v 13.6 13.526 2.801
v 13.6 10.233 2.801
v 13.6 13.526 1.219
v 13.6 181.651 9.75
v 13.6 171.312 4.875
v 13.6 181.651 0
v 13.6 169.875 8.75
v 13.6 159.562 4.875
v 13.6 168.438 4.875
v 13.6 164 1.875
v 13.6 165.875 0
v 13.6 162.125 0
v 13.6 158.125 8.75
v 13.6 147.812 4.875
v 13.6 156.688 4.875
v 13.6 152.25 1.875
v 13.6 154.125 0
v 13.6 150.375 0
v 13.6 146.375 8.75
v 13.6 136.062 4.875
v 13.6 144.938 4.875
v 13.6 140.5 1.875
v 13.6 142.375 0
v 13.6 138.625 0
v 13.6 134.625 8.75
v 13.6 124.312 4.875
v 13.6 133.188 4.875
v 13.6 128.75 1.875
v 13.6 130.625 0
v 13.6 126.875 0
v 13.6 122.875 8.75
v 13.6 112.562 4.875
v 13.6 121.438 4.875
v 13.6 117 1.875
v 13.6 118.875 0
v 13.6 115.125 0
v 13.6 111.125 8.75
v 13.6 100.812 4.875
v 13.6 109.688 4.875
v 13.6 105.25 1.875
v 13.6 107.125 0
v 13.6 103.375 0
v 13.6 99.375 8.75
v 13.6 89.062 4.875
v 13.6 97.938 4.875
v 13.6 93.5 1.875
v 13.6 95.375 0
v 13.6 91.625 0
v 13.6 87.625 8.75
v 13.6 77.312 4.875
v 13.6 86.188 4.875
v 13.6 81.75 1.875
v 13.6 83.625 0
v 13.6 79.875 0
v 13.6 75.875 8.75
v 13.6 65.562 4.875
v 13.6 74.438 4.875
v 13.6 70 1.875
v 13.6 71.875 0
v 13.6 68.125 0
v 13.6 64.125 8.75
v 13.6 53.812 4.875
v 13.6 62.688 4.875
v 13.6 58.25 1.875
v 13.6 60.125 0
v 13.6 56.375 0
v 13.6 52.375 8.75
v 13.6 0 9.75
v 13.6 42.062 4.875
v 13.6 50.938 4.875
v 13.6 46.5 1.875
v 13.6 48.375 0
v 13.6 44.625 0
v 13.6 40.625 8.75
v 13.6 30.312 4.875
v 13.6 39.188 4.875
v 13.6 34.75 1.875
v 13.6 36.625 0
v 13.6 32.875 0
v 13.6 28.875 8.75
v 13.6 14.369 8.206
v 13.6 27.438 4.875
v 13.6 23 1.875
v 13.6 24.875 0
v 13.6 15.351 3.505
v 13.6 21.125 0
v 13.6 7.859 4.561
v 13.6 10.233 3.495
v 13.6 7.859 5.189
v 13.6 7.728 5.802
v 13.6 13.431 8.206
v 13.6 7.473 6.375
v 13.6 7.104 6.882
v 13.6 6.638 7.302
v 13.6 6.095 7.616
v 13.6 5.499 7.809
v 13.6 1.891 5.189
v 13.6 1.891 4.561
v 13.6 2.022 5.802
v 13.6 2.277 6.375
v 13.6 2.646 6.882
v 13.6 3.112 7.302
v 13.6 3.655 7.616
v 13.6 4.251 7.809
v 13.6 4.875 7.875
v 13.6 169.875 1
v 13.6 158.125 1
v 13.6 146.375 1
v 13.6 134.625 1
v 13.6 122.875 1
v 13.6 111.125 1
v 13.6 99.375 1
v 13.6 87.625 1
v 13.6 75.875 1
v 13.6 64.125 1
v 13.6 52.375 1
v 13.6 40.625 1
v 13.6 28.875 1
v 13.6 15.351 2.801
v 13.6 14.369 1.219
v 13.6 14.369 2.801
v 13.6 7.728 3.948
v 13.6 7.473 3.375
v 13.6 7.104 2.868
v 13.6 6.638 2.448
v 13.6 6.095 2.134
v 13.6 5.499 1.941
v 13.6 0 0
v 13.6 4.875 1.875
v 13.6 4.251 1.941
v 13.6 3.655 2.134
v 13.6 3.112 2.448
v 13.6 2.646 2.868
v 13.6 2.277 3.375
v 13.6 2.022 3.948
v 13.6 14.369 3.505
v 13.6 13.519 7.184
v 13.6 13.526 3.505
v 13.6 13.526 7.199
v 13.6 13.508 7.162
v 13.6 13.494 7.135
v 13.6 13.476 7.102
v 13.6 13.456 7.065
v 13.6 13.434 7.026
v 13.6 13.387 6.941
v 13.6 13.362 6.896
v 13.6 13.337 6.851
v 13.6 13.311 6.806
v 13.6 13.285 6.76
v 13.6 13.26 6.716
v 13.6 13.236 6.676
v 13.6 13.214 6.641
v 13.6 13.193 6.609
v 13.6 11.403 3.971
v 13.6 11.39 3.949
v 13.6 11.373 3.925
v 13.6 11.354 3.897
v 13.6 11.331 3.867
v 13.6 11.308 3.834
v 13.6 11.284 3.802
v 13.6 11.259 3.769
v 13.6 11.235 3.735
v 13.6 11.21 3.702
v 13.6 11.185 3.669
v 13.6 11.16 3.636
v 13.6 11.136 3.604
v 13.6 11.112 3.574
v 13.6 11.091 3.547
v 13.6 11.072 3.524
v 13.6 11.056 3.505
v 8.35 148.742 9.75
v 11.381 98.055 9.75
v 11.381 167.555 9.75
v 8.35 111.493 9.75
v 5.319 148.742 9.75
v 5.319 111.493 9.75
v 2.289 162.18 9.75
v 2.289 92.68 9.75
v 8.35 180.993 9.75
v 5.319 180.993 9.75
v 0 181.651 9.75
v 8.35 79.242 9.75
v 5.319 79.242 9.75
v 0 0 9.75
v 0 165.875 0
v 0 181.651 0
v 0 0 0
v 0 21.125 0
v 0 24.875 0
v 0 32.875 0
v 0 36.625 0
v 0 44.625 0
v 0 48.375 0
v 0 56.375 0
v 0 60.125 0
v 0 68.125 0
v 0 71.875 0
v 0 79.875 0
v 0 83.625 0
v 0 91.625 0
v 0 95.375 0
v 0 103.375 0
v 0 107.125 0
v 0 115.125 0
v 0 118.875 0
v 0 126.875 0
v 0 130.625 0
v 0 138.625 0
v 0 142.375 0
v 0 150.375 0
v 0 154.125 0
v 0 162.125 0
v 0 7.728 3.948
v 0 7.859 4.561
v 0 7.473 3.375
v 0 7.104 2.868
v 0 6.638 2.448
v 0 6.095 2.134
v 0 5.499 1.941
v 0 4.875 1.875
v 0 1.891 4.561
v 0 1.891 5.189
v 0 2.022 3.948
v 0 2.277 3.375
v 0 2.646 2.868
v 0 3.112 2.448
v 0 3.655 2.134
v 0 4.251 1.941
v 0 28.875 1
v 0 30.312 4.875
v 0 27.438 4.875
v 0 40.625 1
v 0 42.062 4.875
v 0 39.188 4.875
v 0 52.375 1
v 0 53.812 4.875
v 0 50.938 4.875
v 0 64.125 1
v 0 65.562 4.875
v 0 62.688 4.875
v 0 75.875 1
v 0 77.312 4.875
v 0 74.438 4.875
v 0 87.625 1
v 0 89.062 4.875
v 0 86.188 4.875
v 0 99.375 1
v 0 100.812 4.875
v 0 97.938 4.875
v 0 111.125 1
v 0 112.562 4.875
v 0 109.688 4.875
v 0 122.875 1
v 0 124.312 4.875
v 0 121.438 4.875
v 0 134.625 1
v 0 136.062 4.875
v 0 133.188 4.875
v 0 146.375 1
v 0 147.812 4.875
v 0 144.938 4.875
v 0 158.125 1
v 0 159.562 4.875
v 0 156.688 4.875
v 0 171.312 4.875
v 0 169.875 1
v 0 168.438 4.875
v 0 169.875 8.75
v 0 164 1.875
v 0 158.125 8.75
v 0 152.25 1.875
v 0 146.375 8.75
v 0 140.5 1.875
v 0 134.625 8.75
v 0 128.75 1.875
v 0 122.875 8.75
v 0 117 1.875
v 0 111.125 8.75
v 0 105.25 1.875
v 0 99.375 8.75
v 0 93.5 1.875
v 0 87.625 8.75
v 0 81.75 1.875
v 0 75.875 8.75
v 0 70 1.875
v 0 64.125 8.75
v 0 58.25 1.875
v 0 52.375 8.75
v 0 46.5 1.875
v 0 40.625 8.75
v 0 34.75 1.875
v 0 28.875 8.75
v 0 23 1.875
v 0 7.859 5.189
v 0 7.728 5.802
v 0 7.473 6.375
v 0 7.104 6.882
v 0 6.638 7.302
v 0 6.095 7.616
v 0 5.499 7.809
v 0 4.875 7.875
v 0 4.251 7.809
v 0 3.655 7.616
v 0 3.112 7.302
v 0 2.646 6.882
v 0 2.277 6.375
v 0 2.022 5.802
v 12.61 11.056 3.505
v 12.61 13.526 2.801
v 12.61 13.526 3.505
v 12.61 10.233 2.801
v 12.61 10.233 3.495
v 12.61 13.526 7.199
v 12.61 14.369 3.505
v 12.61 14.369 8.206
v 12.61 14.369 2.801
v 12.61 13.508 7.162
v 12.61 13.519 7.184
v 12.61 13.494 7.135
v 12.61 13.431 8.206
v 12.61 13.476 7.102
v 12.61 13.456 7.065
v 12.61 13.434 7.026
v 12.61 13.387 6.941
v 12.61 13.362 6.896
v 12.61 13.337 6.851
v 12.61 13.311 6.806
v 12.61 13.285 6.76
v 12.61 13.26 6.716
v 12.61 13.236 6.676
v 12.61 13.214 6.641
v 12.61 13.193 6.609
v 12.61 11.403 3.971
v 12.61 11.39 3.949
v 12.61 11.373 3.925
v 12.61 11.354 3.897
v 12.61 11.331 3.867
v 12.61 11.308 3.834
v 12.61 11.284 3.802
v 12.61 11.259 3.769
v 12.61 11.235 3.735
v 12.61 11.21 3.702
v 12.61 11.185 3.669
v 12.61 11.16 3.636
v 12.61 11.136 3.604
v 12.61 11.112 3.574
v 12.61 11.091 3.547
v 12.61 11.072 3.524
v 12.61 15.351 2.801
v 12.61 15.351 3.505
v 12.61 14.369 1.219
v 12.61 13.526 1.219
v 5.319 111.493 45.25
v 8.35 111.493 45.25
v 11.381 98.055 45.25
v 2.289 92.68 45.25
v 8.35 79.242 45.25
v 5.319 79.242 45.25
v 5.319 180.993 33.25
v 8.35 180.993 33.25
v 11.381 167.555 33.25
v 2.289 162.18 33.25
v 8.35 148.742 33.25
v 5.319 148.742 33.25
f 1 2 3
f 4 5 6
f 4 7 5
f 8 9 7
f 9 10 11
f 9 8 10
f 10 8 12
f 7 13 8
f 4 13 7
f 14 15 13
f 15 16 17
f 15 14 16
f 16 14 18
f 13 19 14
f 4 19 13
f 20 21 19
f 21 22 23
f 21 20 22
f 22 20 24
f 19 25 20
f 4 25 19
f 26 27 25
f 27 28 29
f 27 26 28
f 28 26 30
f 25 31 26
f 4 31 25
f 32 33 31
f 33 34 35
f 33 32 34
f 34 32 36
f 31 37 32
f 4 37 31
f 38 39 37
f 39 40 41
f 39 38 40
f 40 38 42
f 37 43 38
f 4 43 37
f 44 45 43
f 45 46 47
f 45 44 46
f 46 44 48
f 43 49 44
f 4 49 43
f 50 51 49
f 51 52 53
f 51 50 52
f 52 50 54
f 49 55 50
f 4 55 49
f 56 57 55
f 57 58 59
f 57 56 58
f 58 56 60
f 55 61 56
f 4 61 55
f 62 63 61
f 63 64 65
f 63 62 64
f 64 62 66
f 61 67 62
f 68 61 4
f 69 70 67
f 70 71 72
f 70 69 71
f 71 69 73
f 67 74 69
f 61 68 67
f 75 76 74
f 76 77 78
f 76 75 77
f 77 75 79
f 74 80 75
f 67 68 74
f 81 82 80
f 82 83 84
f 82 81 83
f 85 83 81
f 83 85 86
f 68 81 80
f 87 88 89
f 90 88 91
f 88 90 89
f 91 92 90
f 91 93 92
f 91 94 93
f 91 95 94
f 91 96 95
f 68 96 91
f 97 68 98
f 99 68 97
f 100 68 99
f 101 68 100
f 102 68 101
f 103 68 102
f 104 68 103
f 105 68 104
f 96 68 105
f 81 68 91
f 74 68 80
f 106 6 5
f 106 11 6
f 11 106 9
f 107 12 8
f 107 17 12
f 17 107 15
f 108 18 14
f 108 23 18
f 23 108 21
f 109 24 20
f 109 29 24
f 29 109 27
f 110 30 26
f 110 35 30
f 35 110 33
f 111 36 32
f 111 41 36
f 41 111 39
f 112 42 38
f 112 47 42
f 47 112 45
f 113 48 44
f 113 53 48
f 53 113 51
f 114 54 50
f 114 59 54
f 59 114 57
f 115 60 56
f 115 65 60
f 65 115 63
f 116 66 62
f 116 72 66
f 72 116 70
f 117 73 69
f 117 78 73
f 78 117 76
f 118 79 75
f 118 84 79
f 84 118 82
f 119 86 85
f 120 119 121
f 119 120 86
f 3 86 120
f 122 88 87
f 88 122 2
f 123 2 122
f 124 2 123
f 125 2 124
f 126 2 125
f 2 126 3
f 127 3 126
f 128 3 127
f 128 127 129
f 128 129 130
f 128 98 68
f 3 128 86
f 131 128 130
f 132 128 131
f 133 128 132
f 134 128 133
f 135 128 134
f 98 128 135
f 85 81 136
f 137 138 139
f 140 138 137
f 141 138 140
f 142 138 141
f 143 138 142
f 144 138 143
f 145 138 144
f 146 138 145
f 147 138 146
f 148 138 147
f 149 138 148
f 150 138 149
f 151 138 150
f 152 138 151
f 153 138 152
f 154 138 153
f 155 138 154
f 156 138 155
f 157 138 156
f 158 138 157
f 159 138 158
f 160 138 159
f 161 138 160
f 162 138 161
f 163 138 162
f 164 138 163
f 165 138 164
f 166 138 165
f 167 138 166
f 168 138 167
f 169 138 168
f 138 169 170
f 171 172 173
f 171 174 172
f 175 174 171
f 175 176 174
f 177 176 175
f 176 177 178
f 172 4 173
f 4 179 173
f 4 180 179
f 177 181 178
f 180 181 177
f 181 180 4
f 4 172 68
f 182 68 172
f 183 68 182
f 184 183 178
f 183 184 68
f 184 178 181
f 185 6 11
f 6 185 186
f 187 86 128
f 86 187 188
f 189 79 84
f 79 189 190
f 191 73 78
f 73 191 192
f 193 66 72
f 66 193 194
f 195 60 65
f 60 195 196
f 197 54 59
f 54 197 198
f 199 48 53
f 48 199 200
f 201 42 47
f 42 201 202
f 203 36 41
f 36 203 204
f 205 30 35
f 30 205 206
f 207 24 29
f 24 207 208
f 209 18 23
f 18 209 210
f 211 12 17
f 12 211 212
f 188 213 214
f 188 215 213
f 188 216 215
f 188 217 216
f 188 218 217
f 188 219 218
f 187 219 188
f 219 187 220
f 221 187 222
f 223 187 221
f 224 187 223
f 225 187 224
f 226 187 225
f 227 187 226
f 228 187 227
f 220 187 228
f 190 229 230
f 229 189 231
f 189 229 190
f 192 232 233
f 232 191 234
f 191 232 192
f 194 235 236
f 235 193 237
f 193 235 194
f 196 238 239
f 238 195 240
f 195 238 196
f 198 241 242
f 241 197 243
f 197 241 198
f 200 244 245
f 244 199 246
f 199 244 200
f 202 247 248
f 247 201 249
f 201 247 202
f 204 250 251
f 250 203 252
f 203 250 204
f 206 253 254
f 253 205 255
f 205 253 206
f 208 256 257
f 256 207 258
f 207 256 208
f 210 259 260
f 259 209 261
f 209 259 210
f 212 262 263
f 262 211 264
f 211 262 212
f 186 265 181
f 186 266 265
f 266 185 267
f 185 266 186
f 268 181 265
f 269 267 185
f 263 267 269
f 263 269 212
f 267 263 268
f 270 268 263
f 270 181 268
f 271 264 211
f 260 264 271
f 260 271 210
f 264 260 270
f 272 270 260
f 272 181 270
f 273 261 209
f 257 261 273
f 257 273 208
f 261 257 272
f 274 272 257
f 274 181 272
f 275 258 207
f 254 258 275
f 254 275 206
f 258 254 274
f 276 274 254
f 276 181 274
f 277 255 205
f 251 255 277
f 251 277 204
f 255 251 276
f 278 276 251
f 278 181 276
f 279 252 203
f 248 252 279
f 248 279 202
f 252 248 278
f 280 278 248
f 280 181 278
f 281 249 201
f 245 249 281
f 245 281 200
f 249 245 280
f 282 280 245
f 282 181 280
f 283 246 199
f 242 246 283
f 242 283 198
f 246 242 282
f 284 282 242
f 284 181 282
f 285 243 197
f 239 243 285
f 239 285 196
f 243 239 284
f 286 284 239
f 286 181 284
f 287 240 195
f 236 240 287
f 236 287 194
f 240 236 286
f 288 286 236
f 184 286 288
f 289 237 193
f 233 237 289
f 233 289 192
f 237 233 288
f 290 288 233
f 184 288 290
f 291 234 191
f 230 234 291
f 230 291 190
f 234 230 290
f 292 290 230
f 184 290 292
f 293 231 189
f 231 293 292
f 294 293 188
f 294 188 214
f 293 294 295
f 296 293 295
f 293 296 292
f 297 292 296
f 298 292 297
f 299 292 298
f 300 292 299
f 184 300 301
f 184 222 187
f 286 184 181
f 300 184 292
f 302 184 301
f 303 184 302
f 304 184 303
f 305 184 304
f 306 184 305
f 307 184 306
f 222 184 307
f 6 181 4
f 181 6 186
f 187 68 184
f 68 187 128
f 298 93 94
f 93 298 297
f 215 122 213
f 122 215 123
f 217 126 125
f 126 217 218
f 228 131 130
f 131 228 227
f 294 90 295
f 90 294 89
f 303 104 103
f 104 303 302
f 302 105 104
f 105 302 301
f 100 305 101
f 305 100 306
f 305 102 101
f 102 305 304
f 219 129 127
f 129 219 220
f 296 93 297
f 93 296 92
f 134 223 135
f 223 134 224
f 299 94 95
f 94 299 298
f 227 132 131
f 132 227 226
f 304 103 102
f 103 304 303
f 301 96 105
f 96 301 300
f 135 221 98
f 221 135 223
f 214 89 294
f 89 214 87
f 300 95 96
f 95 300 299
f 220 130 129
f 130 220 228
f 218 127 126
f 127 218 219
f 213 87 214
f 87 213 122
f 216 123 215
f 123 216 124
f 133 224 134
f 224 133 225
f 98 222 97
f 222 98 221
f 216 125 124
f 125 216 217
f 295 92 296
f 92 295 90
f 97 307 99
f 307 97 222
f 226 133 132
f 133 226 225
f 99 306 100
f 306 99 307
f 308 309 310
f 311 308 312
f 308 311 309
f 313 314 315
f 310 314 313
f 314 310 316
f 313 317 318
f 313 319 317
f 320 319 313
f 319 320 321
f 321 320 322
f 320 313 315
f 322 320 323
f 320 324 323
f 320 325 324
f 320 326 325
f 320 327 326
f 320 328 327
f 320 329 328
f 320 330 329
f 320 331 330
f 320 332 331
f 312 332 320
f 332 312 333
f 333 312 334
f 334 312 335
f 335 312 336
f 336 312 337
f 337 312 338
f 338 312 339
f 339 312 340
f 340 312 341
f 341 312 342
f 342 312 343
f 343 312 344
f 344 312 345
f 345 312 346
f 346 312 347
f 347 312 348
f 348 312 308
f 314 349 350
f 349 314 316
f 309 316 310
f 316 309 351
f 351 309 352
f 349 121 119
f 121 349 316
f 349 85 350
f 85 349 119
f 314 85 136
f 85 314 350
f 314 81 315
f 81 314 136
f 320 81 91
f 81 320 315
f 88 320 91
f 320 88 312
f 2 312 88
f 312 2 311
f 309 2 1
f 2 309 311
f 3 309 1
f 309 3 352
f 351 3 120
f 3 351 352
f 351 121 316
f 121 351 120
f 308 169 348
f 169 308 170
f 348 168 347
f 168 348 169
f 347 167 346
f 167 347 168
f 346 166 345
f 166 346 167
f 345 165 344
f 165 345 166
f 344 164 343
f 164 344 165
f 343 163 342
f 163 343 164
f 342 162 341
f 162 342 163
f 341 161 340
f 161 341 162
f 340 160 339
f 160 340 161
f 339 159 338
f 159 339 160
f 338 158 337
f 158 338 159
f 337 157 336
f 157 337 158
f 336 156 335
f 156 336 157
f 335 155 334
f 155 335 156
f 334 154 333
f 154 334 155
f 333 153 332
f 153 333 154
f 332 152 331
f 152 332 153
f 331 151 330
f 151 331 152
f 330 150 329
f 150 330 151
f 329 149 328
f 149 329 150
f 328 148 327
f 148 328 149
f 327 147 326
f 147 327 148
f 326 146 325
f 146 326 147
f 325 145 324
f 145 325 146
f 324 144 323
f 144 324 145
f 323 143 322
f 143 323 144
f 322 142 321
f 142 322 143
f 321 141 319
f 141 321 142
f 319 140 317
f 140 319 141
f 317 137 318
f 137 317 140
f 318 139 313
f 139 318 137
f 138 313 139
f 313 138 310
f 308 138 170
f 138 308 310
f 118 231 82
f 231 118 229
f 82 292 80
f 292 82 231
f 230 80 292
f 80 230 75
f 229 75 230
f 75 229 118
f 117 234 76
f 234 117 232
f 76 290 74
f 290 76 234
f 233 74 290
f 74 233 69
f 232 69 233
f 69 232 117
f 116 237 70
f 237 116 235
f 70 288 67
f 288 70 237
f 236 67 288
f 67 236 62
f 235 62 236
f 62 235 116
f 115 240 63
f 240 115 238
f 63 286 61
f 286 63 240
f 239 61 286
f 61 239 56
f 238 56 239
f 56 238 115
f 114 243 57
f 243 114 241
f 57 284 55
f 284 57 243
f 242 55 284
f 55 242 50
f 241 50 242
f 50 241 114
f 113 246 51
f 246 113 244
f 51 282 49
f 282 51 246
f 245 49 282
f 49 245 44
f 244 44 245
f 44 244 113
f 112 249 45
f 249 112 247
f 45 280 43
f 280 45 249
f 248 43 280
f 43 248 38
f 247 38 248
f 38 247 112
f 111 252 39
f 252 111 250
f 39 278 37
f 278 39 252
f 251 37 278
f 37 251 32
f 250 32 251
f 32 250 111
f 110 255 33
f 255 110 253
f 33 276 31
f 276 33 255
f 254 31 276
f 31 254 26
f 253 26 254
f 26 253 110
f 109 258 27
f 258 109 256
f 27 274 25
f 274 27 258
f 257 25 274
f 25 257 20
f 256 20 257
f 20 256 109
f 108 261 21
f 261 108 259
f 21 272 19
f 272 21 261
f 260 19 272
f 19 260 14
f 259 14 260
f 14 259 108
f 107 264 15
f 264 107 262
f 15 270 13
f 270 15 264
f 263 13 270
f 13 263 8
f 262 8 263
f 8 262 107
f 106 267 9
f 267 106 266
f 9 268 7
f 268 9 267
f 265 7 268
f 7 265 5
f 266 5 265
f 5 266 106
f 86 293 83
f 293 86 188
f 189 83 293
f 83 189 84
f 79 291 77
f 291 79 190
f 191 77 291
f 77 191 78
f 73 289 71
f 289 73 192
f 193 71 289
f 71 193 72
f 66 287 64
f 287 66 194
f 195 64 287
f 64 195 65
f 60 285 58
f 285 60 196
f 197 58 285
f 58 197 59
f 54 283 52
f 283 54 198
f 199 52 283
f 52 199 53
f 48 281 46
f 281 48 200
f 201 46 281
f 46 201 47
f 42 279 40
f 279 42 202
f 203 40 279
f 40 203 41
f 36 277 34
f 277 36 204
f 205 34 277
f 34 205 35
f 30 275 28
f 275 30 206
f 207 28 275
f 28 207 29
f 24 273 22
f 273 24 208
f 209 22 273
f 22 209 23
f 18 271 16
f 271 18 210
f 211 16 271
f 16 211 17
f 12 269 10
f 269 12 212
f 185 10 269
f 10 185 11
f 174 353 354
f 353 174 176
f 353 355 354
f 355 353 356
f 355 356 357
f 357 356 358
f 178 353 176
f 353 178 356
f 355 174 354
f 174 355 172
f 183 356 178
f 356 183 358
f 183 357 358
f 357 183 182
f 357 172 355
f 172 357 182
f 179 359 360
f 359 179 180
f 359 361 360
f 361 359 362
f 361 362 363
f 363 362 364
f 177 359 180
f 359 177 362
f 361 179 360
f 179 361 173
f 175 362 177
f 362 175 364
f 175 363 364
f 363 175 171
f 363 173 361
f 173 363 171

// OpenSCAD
// file: values.scad
$fs=0.1;
//Constants:
edgeRadius=1.5;
underKeyWidth=13.6;
baseHeight=9.75;
genh=5.791666666666667;
a=27.423996629776394;
b=12.370392724366756;
c=12.370392724366756;
d=38.393595281686956;
overhead=65.81759191146335;
keyTravelDistance=13.0;
desiredGamut=24;
shift=3.092598181091689;
holeScale=0.5;
stalkScale=0.48;

Points = [
[shift,a,0],//0
[(b-shift),0,0],//1
[(b+shift),0,0],//2
[(b+c-shift),d,0],//3
[(c+shift),(a+d),0],//4
[(c-shift),(a+d),0],//5
[shift,a,keyTravelDistance],//6
[(b-shift),0,keyTravelDistance],//7
[(b+shift),0,keyTravelDistance],//8
[(b+c-shift),d,keyTravelDistance],//9
[(c+shift),(a+d),keyTravelDistance],//10
[(c-shift),(a+d),keyTravelDistance],//11
];
Faces = [
[0,1,2,3,4,5],
[1,0,6,7],
[2,1,7,8],
[3,2,8,9],
[4,3,9,10],
[5,4,10,11],
[0,5,11,6],
[11,10,9,8,7,6] 
];
// file: keytop.scad
include<values.scad>;
keytop();

module keytopShape(){
polyhedron(Points,Faces);
}
module keytop(){
difference(){
keytopShape();
translate([(b+c)/4,(d+a)/4,-0.1])
scale(holeScale,holeScale,holeScale)
keytopShape();
edge(6,11,1,-1);
edge(6,7,1,1);
edge(7,8,1,1);
edge(8,9,1,1);
edge(9,10,1,-1,-1);
edge(10,11,1,-1);
}
module edge (point1,point2,d1,d2,d3=1){
difference(){
translate([Points[point1][0],Points[point1][1],Points[point1][2]])
rotate([0,90,atan((Points[point2][1]-Points[point1][1])/(Points[point2][0]-Points[point1][0]))])
translate([0,0,d3*30])
rotate(45,0,0)
cube([pow(2*(edgeRadius*edgeRadius),1/2),pow(2*(edgeRadius*edgeRadius),1/2),90],true);
translate([Points[point1][0],Points[point1][1],Points[point1][2]])
rotate([0,90,atan((Points[point2][1]-Points[point1][1])/(Points[point2][0]-Points[point1][0]))])
translate([d1*edgeRadius,d2*edgeRadius,d3*30])
cylinder(90,edgeRadius,edgeRadius, true);
}
}

}
// main file
use<keytop.scad>
include<values.scad>
rotate([0,90,0])4_8();
module 4_8(keytops=false){
length=181.6509252447967;
rotate([0,-90,0]){
//Main Base:
difference(){
cube([underKeyWidth,length,baseHeight],false);
translate([-.1,0.5*baseHeight,0.5*baseHeight])rotate([0,90,0])
cylinder((underKeyWidth+.2),r=3, false);
translate([underKeyWidth-.99,10,0.125*baseHeight])
rotate([90,0,90])
linear_extrude(height=1){
text("4",size=baseHeight*0.75);
}

//Warp Cuts:
translate([-1,0.0+25+0.25*baseHeight,baseHeight-1])
rotate([0,90,0])
linear_extrude(height=underKeyWidth+2)
polygon(points=[[0.5*baseHeight-1,0],[baseHeight-2,0.25*baseHeight-1],[0.5*baseHeight-1,0.5*baseHeight-2],[0,0.25*baseHeight-1]]);
translate([-1,11.75+25+0.25*baseHeight,baseHeight-1])
rotate([0,90,0])
linear_extrude(height=underKeyWidth+2)
polygon(points=[[0.5*baseHeight-1,0],[baseHeight-2,0.25*baseHeight-1],[0.5*baseHeight-1,0.5*baseHeight-2],[0,0.25*baseHeight-1]]);
translate([-1,23.5+25+0.25*baseHeight,baseHeight-1])
rotate([0,90,0])
linear_extrude(height=underKeyWidth+2)
polygon(points=[[0.5*baseHeight-1,0],[baseHeight-2,0.25*baseHeight-1],[0.5*baseHeight-1,0.5*baseHeight-2],[0,0.25*baseHeight-1]]);
translate([-1,35.25+25+0.25*baseHeight,baseHeight-1])
rotate([0,90,0])
linear_extrude(height=underKeyWidth+2)
polygon(points=[[0.5*baseHeight-1,0],[baseHeight-2,0.25*baseHeight-1],[0.5*baseHeight-1,0.5*baseHeight-2],[0,0.25*baseHeight-1]]);
translate([-1,47.0+25+0.25*baseHeight,baseHeight-1])
rotate([0,90,0])
linear_extrude(height=underKeyWidth+2)
polygon(points=[[0.5*baseHeight-1,0],[baseHeight-2,0.25*baseHeight-1],[0.5*baseHeight-1,0.5*baseHeight-2],[0,0.25*baseHeight-1]]);
translate([-1,58.75+25+0.25*baseHeight,baseHeight-1])
rotate([0,90,0])
linear_extrude(height=underKeyWidth+2)
polygon(points=[[0.5*baseHeight-1,0],[baseHeight-2,0.25*baseHeight-1],[0.5*baseHeight-1,0.5*baseHeight-2],[0,0.25*baseHeight-1]]);
translate([-1,70.5+25+0.25*baseHeight,baseHeight-1])
rotate([0,90,0])
linear_extrude(height=underKeyWidth+2)
polygon(points=[[0.5*baseHeight-1,0],[baseHeight-2,0.25*baseHeight-1],[0.5*baseHeight-1,0.5*baseHeight-2],[0,0.25*baseHeight-1]]);
translate([-1,82.25+25+0.25*baseHeight,baseHeight-1])
rotate([0,90,0])
linear_extrude(height=underKeyWidth+2)
polygon(points=[[0.5*baseHeight-1,0],[baseHeight-2,0.25*baseHeight-1],[0.5*baseHeight-1,0.5*baseHeight-2],[0,0.25*baseHeight-1]]);
translate([-1,94.0+25+0.25*baseHeight,baseHeight-1])
rotate([0,90,0])
linear_extrude(height=underKeyWidth+2)
polygon(points=[[0.5*baseHeight-1,0],[baseHeight-2,0.25*baseHeight-1],[0.5*baseHeight-1,0.5*baseHeight-2],[0,0.25*baseHeight-1]]);
translate([-1,105.75+25+0.25*baseHeight,baseHeight-1])
rotate([0,90,0])
linear_extrude(height=underKeyWidth+2)
polygon(points=[[0.5*baseHeight-1,0],[baseHeight-2,0.25*baseHeight-1],[0.5*baseHeight-1,0.5*baseHeight-2],[0,0.25*baseHeight-1]]);
translate([-1,117.5+25+0.25*baseHeight,baseHeight-1])
rotate([0,90,0])
linear_extrude(height=underKeyWidth+2)
polygon(points=[[0.5*baseHeight-1,0],[baseHeight-2,0.25*baseHeight-1],[0.5*baseHeight-1,0.5*baseHeight-2],[0,0.25*baseHeight-1]]);
translate([-1,129.25+25+0.25*baseHeight,baseHeight-1])
rotate([0,90,0])
linear_extrude(height=underKeyWidth+2)
polygon(points=[[0.5*baseHeight-1,0],[baseHeight-2,0.25*baseHeight-1],[0.5*baseHeight-1,0.5*baseHeight-2],[0,0.25*baseHeight-1]]);
translate([-1,141.0+25+0.25*baseHeight,baseHeight-1])
rotate([0,90,0])
linear_extrude(height=underKeyWidth+2)
polygon(points=[[0.5*baseHeight-1,0],[baseHeight-2,0.25*baseHeight-1],[0.5*baseHeight-1,0.5*baseHeight-2],[0,0.25*baseHeight-1]]);
translate([-1,0.0+25-0.5*baseHeight-1,0.5*baseHeight-3])
rotate([0,90,0])
linear_extrude(height=underKeyWidth+2)
polygon(points=[[0.5*baseHeight-1,0],[baseHeight-2,0.5*baseHeight-1],[0.5*baseHeight-1,baseHeight-2],[0,0.5*baseHeight-1]]);
translate([-1,11.75+25-0.5*baseHeight-1,0.5*baseHeight-3])
rotate([0,90,0])
linear_extrude(height=underKeyWidth+2)
polygon(points=[[0.5*baseHeight-1,0],[baseHeight-2,0.5*baseHeight-1],[0.5*baseHeight-1,baseHeight-2],[0,0.5*baseHeight-1]]);
translate([-1,23.5+25-0.5*baseHeight-1,0.5*baseHeight-3])
rotate([0,90,0])
linear_extrude(height=underKeyWidth+2)
polygon(points=[[0.5*baseHeight-1,0],[baseHeight-2,0.5*baseHeight-1],[0.5*baseHeight-1,baseHeight-2],[0,0.5*baseHeight-1]]);
translate([-1,35.25+25-0.5*baseHeight-1,0.5*baseHeight-3])
rotate([0,90,0])
linear_extrude(height=underKeyWidth+2)
polygon(points=[[0.5*baseHeight-1,0],[baseHeight-2,0.5*baseHeight-1],[0.5*baseHeight-1,baseHeight-2],[0,0.5*baseHeight-1]]);
translate([-1,47.0+25-0.5*baseHeight-1,0.5*baseHeight-3])
rotate([0,90,0])
linear_extrude(height=underKeyWidth+2)
polygon(points=[[0.5*baseHeight-1,0],[baseHeight-2,0.5*baseHeight-1],[0.5*baseHeight-1,baseHeight-2],[0,0.5*baseHeight-1]]);
translate([-1,58.75+25-0.5*baseHeight-1,0.5*baseHeight-3])
rotate([0,90,0])
linear_extrude(height=underKeyWidth+2)
polygon(points=[[0.5*baseHeight-1,0],[baseHeight-2,0.5*baseHeight-1],[0.5*baseHeight-1,baseHeight-2],[0,0.5*baseHeight-1]]);
translate([-1,70.5+25-0.5*baseHeight-1,0.5*baseHeight-3])
rotate([0,90,0])
linear_extrude(height=underKeyWidth+2)
polygon(points=[[0.5*baseHeight-1,0],[baseHeight-2,0.5*baseHeight-1],[0.5*baseHeight-1,baseHeight-2],[0,0.5*baseHeight-1]]);
translate([-1,82.25+25-0.5*baseHeight-1,0.5*baseHeight-3])
rotate([0,90,0])
linear_extrude(height=underKeyWidth+2)
polygon(points=[[0.5*baseHeight-1,0],[baseHeight-2,0.5*baseHeight-1],[0.5*baseHeight-1,baseHeight-2],[0,0.5*baseHeight-1]]);
translate([-1,94.0+25-0.5*baseHeight-1,0.5*baseHeight-3])
rotate([0,90,0])
linear_extrude(height=underKeyWidth+2)
polygon(points=[[0.5*baseHeight-1,0],[baseHeight-2,0.5*baseHeight-1],[0.5*baseHeight-1,baseHeight-2],[0,0.5*baseHeight-1]]);
translate([-1,105.75+25-0.5*baseHeight-1,0.5*baseHeight-3])
rotate([0,90,0])
linear_extrude(height=underKeyWidth+2)
polygon(points=[[0.5*baseHeight-1,0],[baseHeight-2,0.5*baseHeight-1],[0.5*baseHeight-1,baseHeight-2],[0,0.5*baseHeight-1]]);
translate([-1,117.5+25-0.5*baseHeight-1,0.5*baseHeight-3])
rotate([0,90,0])
linear_extrude(height=underKeyWidth+2)
polygon(points=[[0.5*baseHeight-1,0],[baseHeight-2,0.5*baseHeight-1],[0.5*baseHeight-1,baseHeight-2],[0,0.5*baseHeight-1]]);
translate([-1,129.25+25-0.5*baseHeight-1,0.5*baseHeight-3])
rotate([0,90,0])
linear_extrude(height=underKeyWidth+2)
polygon(points=[[0.5*baseHeight-1,0],[baseHeight-2,0.5*baseHeight-1],[0.5*baseHeight-1,baseHeight-2],[0,0.5*baseHeight-1]]);
translate([-1,141.0+25-0.5*baseHeight-1,0.5*baseHeight-3])
rotate([0,90,0])
linear_extrude(height=underKeyWidth+2)
polygon(points=[[0.5*baseHeight-1,0],[baseHeight-2,0.5*baseHeight-1],[0.5*baseHeight-1,baseHeight-2],[0,0.5*baseHeight-1]]);
}
//Key Stalks:
translate([shift/4,(genh*8-(d+a)/2+overhead),baseHeight]){
linear_extrude(height=(keyTravelDistance*1.5+desiredGamut-8)){
scale((stalkScale+holeScale)/2,stalkScale)
polygon(points=[
[Points[0][0],Points[0][1]],[Points[1][0],Points[1][1]],[Points[2][0],Points[2][1]],[Points[3][0],Points[3][1]],[Points[4][0],Points[4][1]],[Points[5][0],Points[5][1]],[Points[6][0],Points[6][1]]
]);
}
if(keytops)
translate([0,(-0.5*(a+d)),(keyTravelDistance*1.5+desiredGamut-8+40)])
keytop();
}
translate([shift/4,(genh*20-(d+a)/2+overhead),baseHeight]){
linear_extrude(height=(keyTravelDistance*1.5+desiredGamut-20)){
scale((stalkScale+holeScale)/2,stalkScale)
polygon(points=[
[Points[0][0],Points[0][1]],[Points[1][0],Points[1][1]],[Points[2][0],Points[2][1]],[Points[3][0],Points[3][1]],[Points[4][0],Points[4][1]],[Points[5][0],Points[5][1]],[Points[6][0],Points[6][1]]
]);
}
if(keytops)
translate([0,(-0.5*(a+d)),(keyTravelDistance*1.5+desiredGamut-20+40)])
keytop();
}
}}
